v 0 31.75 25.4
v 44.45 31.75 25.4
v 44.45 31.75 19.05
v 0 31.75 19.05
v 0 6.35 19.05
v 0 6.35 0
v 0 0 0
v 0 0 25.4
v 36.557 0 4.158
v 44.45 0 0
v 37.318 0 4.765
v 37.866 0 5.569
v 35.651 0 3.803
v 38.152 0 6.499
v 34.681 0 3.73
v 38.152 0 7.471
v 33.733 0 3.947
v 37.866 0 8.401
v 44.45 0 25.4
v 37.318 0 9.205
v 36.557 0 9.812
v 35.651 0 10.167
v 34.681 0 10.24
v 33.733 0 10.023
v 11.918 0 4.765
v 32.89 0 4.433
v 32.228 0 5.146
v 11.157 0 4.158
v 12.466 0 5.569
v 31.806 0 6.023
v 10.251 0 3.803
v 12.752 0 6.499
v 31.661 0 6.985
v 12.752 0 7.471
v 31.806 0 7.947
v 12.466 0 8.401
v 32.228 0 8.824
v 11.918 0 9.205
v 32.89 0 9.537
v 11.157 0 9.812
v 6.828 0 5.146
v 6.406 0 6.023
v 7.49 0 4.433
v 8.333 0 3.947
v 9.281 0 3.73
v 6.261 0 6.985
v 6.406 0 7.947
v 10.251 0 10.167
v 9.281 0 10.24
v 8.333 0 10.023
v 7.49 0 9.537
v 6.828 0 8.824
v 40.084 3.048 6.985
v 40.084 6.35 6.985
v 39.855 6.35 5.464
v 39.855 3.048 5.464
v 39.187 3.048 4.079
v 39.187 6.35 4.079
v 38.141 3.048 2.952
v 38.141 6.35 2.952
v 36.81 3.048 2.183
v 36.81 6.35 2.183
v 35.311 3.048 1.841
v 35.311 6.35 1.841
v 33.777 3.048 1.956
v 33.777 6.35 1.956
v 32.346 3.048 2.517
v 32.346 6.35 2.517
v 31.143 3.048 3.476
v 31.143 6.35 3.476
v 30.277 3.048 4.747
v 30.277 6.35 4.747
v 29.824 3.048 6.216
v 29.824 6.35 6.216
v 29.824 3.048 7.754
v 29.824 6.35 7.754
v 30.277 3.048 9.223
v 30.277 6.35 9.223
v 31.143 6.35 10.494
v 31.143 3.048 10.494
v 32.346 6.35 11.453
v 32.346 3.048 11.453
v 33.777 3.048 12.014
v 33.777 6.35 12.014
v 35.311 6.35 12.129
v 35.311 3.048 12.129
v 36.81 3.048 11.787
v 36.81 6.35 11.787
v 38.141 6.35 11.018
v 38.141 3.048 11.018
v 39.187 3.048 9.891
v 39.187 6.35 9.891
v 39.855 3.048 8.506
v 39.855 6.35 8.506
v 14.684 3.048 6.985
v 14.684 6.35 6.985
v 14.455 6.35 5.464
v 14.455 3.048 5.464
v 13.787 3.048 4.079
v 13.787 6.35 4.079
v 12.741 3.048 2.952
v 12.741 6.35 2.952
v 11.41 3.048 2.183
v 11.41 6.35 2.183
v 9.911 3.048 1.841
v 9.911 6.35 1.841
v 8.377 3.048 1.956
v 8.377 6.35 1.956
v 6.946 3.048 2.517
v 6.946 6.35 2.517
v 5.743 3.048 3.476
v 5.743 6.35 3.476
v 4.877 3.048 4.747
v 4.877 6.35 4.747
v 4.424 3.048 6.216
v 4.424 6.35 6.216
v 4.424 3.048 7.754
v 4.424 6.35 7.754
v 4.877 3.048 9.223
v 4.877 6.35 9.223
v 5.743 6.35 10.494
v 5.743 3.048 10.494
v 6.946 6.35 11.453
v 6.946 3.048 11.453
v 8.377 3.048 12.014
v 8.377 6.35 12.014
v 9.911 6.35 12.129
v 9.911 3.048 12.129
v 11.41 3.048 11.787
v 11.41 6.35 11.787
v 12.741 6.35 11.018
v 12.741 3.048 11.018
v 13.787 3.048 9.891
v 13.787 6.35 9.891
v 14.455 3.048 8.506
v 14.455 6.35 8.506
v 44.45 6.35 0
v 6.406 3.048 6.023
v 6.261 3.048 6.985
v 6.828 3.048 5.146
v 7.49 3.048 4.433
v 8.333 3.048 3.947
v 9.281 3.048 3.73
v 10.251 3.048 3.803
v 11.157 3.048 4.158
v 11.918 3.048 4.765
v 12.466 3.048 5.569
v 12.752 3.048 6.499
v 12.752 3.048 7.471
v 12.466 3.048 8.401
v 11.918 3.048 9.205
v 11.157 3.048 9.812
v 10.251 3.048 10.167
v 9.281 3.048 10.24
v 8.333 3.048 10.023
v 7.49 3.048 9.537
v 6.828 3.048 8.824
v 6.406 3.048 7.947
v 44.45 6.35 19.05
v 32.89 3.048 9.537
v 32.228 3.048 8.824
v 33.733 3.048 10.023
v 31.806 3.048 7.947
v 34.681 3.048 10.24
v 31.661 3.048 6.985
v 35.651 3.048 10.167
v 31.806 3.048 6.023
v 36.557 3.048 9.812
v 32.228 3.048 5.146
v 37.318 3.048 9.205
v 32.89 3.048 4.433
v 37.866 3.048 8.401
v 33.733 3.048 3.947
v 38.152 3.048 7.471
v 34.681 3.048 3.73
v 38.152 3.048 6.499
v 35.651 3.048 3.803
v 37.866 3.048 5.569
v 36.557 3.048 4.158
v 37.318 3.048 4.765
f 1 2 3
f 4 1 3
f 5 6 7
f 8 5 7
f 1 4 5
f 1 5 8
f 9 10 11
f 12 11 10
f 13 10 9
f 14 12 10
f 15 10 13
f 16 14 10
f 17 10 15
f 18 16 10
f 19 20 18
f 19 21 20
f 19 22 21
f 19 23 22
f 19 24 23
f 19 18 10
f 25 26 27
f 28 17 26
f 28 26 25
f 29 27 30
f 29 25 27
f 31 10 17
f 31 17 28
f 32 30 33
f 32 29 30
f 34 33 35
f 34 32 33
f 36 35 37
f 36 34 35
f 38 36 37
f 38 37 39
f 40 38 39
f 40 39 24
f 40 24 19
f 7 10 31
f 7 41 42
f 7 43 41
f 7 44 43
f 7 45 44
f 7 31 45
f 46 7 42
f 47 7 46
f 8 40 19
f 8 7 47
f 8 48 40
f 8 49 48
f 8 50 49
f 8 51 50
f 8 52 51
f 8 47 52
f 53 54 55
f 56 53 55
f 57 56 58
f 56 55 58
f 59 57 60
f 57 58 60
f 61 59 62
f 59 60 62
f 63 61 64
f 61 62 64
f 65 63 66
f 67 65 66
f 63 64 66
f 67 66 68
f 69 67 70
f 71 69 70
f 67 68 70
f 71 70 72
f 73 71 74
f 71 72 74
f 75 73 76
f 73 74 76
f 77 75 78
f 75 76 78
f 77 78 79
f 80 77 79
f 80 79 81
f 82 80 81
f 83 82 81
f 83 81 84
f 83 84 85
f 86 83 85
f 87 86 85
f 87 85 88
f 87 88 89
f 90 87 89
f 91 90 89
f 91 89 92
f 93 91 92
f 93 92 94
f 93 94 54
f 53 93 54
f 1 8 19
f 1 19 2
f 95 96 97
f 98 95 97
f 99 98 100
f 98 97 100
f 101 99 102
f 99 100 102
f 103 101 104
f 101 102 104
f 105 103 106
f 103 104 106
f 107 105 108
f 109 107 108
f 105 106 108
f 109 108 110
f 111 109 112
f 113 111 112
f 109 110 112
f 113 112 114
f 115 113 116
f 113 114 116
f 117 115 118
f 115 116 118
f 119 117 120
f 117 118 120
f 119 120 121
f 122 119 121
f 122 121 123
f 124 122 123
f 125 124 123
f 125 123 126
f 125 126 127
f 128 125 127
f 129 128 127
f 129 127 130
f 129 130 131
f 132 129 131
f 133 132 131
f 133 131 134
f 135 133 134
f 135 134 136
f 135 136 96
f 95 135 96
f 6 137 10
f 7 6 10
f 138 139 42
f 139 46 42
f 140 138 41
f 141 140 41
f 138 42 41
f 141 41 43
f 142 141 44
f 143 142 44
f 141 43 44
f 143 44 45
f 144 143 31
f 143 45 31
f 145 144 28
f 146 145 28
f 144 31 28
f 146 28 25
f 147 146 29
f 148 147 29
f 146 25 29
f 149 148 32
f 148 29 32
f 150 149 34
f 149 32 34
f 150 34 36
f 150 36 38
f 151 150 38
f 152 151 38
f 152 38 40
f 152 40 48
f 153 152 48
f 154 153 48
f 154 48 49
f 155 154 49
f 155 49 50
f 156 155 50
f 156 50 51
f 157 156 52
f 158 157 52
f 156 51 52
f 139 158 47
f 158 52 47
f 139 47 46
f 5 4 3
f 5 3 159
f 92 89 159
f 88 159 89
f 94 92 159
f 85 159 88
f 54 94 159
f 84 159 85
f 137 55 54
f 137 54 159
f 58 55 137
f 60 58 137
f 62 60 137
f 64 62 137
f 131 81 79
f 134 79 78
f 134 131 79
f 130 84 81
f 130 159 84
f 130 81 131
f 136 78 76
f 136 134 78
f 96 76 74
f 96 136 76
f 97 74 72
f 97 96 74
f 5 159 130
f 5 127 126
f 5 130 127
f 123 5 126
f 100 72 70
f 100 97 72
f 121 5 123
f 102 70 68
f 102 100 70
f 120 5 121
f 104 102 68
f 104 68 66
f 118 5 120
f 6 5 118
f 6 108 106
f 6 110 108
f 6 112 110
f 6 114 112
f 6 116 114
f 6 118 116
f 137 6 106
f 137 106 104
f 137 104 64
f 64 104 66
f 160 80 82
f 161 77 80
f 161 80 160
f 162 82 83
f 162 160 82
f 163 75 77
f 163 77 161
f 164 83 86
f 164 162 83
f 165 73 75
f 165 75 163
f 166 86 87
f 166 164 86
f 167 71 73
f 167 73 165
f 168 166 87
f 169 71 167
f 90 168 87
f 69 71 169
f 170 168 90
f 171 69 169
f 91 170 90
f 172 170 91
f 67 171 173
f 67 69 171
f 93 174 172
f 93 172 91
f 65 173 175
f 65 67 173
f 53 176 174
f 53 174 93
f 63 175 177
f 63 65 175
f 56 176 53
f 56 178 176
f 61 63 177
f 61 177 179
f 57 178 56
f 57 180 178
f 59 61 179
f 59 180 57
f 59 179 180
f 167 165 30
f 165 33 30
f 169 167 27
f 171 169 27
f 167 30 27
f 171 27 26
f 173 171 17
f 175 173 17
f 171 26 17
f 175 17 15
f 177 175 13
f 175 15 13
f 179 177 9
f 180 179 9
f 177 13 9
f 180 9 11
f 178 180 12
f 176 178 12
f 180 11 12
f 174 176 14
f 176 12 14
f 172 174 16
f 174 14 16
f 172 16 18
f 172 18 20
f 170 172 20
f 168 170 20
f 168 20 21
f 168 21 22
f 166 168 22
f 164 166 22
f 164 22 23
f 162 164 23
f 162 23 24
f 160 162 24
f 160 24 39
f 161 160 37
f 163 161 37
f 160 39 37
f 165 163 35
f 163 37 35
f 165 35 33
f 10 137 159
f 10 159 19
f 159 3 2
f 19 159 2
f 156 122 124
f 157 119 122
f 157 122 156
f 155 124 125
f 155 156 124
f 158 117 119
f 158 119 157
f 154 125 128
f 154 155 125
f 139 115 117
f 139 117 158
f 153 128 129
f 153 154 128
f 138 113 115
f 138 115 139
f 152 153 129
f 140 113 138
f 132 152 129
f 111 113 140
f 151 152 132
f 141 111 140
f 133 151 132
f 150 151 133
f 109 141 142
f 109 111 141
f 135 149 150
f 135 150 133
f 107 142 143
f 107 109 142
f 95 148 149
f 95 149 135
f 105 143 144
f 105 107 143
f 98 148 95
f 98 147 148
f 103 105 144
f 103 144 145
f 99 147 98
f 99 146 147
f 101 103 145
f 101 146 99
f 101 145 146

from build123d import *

# Parameters (mm, degrees)
BOSS_EXTRUDE1_DEPTH                              = 44.45
CBORE_FOR_1_4_SOCKET_SHOULDER_SCREW1_D           = 6.5278
CBORE_FOR_1_4_SOCKET_SHOULDER_SCREW1_CBORE_D     = 10.31748
CBORE_FOR_1_4_SOCKET_SHOULDER_SCREW1_CBORE_DEPTH = 3.302


with BuildPart() as part:
    # Sketch1 → Boss-Extrude1 (new body)
    with BuildSketch(Plane(origin=(0, 0, 0), x_dir=(0, 0, -1), z_dir=(1, 0, 0))):
        Polygon((-25.4, 31.75), (-19.05, 31.75), (-19.05, 6.35), (0, 6.35), (0, 0), (-25.4, 0), align=None)
    extrude(amount=BOSS_EXTRUDE1_DEPTH)

    # CBORE for 1/4 Socket Shoulder Screw1 (through all)
    with Locations(Plane(origin=(0, 6.35, 0), x_dir=(1, 0, 0), z_dir=(0, 1, 0))):
        with Locations((9.525, -6.985), (34.925, -6.985)):
            CounterBoreHole(CBORE_FOR_1_4_SOCKET_SHOULDER_SCREW1_D / 2, CBORE_FOR_1_4_SOCKET_SHOULDER_SCREW1_CBORE_D / 2, CBORE_FOR_1_4_SOCKET_SHOULDER_SCREW1_CBORE_DEPTH)


solid = part.part
